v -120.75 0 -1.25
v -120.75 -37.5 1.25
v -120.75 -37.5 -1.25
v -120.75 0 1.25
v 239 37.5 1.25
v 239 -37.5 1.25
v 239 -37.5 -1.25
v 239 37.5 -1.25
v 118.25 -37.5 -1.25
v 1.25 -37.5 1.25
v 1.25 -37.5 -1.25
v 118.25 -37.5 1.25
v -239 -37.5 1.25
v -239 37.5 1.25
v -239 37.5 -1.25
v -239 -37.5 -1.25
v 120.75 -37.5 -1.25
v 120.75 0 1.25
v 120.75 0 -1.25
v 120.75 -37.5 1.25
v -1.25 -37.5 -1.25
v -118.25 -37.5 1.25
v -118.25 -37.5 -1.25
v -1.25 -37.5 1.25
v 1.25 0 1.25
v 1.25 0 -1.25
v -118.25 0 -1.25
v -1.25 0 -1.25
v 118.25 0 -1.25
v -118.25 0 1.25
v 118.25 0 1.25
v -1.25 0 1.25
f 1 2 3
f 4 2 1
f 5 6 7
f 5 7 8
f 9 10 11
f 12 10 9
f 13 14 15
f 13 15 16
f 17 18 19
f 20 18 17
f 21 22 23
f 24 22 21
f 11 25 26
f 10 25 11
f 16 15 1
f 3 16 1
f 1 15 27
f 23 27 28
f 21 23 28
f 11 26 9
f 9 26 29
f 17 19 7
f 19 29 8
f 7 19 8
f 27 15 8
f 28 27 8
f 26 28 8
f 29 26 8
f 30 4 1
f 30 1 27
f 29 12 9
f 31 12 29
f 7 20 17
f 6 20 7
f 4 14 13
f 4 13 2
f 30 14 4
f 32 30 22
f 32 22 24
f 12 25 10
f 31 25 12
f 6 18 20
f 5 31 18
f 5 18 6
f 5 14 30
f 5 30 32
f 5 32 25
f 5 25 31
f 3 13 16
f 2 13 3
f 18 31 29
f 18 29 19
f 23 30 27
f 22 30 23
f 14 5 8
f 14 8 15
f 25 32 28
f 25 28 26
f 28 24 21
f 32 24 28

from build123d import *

# Parameters (mm, degrees)
BOSS_EXTRUDE1_DEPTH = 1.25


with BuildPart() as part:
    # Sketch1 → Boss-Extrude1 (new, symmetric)
    with BuildSketch(Plane.XY):
        Polygon((-1.25, -37.5), (-1.25, 0), (1.25, 0), (1.25, -37.5), (118.25, -37.5), (118.25, 0), (120.75, 0), (120.75, -37.5), (239, -37.5), (239, 37.5), (-239, 37.5), (-239, -37.5), (-120.75, -37.5), (-120.75, 0), (-118.25, 0), (-118.25, -37.5), align=None)
    extrude(amount=BOSS_EXTRUDE1_DEPTH, both=True)


solid = part.part
